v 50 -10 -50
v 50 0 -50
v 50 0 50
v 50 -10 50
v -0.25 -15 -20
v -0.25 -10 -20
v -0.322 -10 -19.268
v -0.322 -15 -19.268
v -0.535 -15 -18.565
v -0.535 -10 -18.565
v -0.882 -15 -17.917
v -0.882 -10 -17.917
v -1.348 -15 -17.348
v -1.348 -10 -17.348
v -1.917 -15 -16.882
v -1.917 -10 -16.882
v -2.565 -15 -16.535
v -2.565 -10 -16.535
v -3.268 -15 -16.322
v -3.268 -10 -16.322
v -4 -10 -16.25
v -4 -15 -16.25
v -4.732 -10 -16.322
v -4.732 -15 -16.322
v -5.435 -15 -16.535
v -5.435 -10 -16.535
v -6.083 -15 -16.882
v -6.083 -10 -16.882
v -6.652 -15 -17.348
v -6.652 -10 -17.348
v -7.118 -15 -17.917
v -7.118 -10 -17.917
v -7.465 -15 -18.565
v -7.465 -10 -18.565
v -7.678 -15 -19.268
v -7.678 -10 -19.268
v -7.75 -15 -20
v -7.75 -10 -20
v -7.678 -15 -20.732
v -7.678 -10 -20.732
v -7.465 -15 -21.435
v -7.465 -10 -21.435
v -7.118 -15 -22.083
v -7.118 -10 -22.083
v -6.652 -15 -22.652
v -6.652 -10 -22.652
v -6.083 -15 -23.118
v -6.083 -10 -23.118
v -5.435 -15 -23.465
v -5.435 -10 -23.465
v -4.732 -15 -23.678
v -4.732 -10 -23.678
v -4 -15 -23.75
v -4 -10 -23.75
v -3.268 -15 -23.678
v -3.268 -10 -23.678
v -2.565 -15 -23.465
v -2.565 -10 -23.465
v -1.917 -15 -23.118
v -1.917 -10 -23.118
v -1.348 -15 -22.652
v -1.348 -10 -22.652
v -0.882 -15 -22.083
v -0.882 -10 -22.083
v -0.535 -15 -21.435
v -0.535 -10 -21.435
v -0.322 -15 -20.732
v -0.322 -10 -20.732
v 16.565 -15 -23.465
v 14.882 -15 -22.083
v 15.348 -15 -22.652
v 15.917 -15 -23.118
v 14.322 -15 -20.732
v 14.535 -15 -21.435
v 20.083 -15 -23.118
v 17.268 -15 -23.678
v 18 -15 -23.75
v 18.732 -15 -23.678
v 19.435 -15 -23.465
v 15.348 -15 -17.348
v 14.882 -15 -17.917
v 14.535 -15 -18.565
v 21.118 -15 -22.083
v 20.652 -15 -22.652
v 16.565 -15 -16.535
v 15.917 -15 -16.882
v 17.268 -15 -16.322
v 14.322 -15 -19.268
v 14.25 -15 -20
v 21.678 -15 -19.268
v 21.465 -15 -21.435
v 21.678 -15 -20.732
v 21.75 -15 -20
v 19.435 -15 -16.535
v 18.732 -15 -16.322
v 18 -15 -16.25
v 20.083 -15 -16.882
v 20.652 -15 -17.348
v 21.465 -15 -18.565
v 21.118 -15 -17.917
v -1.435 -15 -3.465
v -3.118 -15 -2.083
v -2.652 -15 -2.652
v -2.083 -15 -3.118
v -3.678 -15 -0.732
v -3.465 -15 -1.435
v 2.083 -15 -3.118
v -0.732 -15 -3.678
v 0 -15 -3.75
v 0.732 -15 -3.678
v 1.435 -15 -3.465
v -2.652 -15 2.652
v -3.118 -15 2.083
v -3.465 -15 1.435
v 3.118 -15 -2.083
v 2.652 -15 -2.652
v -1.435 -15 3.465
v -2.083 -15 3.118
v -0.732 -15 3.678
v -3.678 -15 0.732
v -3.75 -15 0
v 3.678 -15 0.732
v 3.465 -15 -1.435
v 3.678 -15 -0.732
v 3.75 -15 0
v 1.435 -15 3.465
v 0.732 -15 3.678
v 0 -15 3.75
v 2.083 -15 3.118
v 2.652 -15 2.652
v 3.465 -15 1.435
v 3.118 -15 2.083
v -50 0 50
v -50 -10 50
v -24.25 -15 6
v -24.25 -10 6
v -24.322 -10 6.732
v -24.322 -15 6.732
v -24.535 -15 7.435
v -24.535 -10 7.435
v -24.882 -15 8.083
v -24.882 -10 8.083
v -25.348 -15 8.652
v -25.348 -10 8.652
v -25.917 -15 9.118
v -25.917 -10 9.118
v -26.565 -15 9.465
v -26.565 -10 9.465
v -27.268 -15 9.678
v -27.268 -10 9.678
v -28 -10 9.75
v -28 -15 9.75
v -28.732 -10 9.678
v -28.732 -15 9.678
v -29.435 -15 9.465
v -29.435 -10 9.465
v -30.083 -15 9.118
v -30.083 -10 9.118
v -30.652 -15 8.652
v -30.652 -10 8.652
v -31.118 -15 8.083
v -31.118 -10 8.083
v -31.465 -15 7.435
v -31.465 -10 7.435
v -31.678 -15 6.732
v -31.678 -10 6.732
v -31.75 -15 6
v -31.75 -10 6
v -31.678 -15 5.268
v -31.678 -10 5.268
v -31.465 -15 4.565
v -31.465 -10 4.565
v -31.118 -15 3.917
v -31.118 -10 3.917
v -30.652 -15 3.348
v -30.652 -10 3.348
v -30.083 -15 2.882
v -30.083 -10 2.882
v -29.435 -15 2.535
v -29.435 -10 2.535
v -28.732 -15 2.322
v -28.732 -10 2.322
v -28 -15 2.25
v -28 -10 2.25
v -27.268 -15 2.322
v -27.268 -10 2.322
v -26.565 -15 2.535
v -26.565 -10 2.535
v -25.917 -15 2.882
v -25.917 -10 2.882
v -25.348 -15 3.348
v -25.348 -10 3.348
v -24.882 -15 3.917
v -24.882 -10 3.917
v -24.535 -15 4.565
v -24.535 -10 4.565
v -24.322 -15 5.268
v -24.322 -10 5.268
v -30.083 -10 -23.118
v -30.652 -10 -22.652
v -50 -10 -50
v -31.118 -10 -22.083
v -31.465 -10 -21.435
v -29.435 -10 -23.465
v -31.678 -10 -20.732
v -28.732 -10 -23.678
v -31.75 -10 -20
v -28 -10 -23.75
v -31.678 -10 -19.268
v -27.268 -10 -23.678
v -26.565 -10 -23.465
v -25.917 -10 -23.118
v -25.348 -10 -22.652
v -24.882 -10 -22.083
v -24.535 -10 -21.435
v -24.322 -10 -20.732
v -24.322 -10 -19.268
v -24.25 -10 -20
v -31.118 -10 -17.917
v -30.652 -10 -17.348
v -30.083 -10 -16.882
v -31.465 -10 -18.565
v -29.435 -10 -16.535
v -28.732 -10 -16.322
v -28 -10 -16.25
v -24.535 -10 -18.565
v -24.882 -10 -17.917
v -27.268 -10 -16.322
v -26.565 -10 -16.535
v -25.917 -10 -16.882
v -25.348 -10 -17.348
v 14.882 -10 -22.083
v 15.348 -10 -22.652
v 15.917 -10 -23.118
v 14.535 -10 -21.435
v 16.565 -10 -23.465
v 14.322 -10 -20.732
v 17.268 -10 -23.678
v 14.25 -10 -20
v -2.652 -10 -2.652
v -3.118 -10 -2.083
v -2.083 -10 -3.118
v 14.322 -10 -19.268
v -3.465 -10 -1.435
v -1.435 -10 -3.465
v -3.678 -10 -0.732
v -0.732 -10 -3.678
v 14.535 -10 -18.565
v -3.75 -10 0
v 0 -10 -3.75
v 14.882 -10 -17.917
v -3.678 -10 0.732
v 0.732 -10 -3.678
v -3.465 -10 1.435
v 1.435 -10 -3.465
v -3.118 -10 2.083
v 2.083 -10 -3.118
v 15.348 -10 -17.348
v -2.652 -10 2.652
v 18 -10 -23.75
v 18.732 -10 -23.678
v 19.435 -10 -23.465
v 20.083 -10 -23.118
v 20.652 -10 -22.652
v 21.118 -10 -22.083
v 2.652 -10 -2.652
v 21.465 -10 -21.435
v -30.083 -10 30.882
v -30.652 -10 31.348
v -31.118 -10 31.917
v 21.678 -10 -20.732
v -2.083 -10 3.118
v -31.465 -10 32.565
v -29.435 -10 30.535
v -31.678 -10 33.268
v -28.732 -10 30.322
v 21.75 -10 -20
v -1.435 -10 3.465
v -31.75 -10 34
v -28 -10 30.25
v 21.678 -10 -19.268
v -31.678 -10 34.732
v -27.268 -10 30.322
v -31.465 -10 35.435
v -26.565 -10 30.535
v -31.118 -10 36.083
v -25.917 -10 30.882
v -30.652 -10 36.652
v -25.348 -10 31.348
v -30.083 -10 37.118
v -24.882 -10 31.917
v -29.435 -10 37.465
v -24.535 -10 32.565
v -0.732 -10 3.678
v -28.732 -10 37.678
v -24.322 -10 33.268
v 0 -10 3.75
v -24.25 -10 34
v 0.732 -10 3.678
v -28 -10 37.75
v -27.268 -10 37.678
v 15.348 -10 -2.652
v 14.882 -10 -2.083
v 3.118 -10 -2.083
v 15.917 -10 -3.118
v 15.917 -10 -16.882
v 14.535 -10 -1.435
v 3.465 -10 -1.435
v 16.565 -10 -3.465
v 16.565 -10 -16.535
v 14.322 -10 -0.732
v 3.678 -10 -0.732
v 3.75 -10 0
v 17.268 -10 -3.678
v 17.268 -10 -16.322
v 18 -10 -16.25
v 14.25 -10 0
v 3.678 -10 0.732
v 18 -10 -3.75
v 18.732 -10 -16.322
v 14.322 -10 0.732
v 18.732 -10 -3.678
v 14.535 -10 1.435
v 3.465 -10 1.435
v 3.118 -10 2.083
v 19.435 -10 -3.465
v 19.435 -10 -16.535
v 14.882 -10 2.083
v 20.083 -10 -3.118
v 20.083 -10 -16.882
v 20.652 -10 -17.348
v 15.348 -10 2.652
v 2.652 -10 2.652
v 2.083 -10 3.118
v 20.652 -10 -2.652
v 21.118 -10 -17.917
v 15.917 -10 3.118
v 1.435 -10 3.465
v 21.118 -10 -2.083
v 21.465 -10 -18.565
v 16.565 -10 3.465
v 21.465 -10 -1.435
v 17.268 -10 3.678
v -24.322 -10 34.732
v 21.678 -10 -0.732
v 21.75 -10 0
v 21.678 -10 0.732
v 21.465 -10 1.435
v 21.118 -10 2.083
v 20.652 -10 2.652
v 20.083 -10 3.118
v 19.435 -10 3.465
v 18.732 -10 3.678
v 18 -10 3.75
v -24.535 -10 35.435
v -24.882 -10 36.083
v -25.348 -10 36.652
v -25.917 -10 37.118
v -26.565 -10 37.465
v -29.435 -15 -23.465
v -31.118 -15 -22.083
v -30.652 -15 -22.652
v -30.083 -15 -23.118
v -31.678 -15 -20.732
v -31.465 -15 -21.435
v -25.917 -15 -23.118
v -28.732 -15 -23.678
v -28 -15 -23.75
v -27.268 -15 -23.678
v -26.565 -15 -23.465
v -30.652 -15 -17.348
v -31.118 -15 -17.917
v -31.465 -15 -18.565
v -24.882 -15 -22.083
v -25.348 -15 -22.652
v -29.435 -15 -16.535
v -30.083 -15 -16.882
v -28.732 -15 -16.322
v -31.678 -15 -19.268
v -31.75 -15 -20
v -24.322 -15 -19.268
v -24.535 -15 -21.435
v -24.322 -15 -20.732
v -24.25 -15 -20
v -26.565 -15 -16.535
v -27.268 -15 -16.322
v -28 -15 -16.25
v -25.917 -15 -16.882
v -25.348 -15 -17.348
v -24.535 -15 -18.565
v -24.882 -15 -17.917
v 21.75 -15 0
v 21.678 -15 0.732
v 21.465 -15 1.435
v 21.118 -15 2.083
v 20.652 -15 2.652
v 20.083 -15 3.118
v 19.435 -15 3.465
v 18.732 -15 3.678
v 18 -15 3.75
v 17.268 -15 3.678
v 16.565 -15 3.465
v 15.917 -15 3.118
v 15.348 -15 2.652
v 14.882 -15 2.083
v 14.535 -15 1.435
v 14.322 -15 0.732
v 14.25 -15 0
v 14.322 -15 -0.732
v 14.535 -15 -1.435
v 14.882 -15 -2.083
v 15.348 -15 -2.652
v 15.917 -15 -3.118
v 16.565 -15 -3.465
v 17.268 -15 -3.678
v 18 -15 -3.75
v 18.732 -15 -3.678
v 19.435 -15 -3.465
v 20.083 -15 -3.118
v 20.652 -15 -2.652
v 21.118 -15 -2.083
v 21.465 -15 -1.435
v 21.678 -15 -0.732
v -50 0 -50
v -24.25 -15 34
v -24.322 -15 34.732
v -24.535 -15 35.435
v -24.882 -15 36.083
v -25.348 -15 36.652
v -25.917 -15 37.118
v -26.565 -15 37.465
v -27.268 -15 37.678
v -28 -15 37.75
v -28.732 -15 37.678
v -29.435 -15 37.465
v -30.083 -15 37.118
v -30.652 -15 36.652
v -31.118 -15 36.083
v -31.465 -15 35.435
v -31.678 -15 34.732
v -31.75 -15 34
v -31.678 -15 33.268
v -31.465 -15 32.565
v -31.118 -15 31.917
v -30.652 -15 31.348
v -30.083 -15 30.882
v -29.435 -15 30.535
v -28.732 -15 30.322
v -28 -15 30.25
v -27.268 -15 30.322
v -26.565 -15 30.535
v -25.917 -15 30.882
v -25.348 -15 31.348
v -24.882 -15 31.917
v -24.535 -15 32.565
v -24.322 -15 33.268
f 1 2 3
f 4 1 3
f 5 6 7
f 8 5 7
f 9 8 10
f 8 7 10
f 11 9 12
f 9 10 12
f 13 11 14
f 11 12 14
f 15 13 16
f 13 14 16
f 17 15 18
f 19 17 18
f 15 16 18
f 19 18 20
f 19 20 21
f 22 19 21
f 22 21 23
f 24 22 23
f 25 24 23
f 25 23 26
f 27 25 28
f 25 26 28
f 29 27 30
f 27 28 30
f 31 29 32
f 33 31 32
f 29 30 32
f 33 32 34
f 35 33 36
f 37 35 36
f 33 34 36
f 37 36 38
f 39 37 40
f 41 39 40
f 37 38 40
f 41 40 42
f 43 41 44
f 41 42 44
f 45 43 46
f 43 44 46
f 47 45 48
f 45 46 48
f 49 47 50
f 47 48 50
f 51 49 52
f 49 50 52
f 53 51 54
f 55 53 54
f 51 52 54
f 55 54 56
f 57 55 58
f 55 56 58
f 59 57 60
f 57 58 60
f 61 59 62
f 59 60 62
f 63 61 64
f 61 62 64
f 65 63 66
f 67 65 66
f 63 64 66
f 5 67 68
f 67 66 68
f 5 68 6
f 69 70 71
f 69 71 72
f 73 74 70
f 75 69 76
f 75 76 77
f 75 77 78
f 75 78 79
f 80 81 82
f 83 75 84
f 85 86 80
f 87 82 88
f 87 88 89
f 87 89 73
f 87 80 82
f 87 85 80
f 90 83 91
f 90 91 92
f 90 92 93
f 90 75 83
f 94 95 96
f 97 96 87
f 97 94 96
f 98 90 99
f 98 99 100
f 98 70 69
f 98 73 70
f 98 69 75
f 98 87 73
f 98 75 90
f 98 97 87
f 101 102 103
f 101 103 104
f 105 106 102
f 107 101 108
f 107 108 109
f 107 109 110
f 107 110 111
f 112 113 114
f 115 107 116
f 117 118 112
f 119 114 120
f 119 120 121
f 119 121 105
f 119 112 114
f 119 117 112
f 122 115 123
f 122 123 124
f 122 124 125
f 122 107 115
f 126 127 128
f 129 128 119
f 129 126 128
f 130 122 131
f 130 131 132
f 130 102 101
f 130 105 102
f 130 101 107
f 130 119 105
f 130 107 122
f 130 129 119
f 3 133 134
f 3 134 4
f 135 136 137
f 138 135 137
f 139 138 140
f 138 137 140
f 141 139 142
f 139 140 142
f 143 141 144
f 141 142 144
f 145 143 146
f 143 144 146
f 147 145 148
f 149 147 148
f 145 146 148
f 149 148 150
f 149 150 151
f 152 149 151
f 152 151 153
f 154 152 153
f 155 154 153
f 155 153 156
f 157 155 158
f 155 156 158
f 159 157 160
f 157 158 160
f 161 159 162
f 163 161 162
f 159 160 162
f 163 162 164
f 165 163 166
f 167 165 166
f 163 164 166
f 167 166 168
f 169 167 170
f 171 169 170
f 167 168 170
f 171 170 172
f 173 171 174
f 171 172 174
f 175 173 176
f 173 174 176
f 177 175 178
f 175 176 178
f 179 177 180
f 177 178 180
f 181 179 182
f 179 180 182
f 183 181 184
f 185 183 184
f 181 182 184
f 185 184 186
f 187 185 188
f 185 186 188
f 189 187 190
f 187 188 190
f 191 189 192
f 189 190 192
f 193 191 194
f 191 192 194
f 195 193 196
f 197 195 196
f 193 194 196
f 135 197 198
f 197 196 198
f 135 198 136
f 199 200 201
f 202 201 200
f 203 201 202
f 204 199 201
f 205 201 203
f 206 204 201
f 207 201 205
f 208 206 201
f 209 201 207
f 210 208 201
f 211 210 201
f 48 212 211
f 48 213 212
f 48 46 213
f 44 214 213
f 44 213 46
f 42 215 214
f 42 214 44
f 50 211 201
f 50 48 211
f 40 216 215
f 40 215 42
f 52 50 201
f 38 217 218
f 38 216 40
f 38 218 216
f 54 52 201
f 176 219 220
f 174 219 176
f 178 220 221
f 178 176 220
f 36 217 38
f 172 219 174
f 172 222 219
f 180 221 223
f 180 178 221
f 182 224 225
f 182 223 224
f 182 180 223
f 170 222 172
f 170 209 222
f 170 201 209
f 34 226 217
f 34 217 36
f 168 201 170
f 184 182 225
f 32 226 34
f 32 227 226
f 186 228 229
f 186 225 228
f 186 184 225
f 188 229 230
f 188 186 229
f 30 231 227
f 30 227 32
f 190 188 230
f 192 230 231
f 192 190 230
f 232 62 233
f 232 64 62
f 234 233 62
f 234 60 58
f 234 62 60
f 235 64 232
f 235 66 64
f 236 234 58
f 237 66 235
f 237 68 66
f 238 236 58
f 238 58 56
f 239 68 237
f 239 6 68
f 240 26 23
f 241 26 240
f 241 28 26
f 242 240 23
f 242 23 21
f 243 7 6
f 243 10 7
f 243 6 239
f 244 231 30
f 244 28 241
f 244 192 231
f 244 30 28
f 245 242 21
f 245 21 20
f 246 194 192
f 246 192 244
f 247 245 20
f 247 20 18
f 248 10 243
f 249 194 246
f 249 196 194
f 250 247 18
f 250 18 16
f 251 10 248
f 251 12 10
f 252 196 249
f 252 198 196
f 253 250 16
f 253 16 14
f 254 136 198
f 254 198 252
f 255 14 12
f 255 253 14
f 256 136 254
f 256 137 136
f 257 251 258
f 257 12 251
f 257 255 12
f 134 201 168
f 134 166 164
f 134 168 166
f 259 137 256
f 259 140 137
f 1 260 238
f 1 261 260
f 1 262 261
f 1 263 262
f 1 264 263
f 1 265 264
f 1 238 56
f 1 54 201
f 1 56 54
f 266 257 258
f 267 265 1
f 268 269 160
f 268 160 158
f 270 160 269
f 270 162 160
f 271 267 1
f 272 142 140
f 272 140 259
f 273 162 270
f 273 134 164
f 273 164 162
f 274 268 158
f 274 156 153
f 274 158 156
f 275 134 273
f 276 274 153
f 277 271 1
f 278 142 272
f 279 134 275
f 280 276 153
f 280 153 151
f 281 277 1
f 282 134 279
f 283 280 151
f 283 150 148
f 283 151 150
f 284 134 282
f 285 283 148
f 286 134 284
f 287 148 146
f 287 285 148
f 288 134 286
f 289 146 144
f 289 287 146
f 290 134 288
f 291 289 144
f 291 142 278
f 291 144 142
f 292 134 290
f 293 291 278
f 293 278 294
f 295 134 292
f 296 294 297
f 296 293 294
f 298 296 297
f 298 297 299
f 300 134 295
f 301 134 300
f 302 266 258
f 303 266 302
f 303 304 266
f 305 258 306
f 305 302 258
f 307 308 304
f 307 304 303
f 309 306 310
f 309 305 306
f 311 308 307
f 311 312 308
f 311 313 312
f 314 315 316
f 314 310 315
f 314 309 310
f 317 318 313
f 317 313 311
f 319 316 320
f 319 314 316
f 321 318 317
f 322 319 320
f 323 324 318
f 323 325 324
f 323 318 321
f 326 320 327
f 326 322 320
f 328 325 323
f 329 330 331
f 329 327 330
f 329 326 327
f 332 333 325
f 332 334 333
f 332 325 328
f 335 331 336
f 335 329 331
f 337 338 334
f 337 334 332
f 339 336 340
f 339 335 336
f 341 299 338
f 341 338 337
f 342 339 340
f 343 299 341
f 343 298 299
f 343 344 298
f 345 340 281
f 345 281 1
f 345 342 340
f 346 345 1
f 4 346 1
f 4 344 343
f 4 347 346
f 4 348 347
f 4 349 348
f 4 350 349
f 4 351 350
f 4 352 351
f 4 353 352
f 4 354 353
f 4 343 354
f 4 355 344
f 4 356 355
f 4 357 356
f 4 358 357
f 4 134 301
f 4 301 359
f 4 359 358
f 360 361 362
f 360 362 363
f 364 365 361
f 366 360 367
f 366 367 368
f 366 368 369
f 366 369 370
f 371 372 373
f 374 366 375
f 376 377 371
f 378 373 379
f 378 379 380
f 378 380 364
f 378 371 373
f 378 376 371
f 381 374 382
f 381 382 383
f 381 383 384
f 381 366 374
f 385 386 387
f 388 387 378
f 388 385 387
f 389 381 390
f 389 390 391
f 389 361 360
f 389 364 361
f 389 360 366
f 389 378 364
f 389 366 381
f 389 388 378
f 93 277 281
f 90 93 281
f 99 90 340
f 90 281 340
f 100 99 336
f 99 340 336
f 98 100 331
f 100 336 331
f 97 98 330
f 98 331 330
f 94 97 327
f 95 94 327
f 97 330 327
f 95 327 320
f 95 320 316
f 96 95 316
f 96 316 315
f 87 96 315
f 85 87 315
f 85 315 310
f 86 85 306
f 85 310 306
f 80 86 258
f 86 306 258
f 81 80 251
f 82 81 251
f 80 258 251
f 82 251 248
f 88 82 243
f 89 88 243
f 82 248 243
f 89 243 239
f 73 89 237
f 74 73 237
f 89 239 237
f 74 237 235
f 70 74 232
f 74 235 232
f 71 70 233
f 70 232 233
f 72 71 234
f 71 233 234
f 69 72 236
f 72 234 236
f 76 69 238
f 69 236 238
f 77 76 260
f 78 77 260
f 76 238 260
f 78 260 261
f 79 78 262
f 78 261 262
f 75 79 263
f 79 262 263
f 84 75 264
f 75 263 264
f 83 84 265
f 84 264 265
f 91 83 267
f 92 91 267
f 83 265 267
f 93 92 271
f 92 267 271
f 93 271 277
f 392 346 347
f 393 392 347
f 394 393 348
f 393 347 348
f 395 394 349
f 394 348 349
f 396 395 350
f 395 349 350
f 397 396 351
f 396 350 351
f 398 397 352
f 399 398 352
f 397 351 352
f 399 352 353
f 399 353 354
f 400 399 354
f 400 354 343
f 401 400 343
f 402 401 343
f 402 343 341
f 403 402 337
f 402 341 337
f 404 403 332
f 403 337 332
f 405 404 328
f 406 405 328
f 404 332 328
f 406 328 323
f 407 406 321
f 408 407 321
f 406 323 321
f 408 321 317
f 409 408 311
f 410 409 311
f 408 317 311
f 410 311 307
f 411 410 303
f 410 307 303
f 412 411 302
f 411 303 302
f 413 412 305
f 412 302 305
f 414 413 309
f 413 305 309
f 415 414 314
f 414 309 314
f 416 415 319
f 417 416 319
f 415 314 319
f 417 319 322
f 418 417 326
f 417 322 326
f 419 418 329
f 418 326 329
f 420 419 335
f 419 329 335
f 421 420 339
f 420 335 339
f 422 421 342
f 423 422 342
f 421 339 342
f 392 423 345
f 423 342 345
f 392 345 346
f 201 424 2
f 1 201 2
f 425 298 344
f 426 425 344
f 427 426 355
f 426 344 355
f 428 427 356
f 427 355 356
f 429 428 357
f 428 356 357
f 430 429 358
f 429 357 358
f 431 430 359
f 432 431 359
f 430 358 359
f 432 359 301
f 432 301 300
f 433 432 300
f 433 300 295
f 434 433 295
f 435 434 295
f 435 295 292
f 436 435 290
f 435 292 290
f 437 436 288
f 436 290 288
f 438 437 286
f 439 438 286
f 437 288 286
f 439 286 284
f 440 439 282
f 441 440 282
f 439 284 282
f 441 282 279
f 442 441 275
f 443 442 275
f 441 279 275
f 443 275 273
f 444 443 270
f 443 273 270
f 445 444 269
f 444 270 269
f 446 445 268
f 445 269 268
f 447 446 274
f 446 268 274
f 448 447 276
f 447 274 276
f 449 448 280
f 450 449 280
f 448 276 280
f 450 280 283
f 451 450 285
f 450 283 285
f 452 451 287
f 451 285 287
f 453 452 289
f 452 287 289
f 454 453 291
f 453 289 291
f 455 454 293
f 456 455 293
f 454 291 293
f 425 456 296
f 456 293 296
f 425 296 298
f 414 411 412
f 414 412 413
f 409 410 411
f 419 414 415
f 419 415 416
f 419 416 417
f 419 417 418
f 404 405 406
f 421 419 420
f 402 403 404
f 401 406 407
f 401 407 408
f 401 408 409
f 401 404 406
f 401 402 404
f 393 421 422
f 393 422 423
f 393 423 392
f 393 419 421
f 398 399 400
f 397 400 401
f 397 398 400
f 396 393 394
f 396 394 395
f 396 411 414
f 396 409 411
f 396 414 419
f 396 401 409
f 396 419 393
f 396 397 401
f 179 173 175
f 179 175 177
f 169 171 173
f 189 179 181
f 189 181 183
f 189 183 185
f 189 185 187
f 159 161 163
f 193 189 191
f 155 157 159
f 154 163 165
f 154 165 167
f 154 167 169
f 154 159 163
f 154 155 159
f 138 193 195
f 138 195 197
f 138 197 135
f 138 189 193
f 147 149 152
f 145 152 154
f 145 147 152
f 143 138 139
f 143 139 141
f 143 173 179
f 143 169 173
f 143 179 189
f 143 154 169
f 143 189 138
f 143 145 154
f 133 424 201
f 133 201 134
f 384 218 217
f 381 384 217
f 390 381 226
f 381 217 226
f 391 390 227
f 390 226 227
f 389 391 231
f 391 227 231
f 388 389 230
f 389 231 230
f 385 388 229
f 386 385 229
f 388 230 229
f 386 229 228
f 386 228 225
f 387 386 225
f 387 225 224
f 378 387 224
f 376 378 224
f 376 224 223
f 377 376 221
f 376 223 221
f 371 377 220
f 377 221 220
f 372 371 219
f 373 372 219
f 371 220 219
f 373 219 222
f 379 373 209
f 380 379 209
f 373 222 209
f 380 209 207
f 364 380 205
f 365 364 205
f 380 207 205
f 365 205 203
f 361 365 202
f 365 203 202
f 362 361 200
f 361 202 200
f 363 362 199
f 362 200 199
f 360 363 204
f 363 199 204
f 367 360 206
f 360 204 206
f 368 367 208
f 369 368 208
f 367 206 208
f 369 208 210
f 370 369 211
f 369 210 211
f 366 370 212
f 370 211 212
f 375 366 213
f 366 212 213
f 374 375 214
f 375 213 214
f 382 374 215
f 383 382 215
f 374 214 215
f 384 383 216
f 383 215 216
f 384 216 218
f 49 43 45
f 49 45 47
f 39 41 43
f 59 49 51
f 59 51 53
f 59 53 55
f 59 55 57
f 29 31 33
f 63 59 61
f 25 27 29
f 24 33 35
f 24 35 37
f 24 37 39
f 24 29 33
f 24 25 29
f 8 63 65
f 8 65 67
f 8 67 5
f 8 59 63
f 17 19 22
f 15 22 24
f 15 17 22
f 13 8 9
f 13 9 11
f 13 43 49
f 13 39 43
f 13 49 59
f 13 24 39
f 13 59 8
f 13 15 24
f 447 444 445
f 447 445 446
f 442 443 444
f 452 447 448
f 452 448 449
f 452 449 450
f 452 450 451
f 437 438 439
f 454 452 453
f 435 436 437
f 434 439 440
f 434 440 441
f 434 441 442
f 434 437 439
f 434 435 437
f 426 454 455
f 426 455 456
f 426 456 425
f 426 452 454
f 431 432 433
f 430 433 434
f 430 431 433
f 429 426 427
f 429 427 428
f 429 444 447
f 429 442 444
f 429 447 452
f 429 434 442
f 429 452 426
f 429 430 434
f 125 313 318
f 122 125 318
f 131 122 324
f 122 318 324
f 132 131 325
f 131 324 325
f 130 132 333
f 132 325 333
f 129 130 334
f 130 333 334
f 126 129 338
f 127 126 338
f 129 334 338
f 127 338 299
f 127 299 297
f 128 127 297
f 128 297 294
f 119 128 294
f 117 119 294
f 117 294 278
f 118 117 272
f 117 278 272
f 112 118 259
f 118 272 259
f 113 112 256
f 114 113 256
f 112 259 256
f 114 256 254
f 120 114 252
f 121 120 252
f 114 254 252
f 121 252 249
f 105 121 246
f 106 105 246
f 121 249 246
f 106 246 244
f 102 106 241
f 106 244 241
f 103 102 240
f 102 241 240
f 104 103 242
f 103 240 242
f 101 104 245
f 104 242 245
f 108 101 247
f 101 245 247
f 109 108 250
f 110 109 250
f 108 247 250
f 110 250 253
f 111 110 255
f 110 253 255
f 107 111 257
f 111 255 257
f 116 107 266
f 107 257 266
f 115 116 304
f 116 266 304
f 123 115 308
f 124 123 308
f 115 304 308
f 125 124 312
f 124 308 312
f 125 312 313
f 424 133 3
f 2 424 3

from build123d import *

# Parameters (mm, degrees)
F0_W      = 100
F0_H      = 100
F1_DEPTH  = 10
F2_R      = 3.75
F3_DEPTH  = 5
F4_R      = 3.75
F5_DEPTH  = 5
F7_R      = 3.75
F8_DEPTH  = 5
F9_R      = 3.75
F10_DEPTH = 5
F11_R     = 3.75
F12_DEPTH = 5
F13_R     = 3.75
F14_DEPTH = 5
F6_R      = 3.75
F15_DEPTH = 5


with BuildPart() as f1:
    # F0 (on Front) → F1 (new body)
    with BuildSketch(Plane.XZ):
        Rectangle(F0_W, F0_H)
    extrude(amount=F1_DEPTH)

    # F2 (on face) → F3 (join)
    with BuildSketch(Plane.XZ.offset(10)):
        Circle(F2_R)
    extrude(amount=F3_DEPTH)

    # F4 (on face) → F5 (join)
    with BuildSketch(Plane.XZ.offset(10)):
        with Locations((18, 0)):
            Circle(F4_R)
    extrude(amount=F5_DEPTH)

    # F7 (on face) → F8 (join)
    with BuildSketch(Plane.XZ.offset(10)):
        with Locations((-4, -20)):
            Circle(F7_R)
    extrude(amount=F8_DEPTH)

    # F9 (on face) → F10 (join)
    with BuildSketch(Plane.XZ.offset(10)):
        with Locations((-28, -20)):
            Circle(F9_R)
    extrude(amount=F10_DEPTH)

    # F11 (on face) → F12 (join)
    with BuildSketch(Plane.XZ.offset(10)):
        with Locations((-28, 6)):
            Circle(F11_R)
    extrude(amount=F12_DEPTH)

    # F13 (on face) → F14 (join)
    with BuildSketch(Plane.XZ.offset(10)):
        with Locations((-28, 34)):
            Circle(F13_R)
    extrude(amount=F14_DEPTH)

    # F6 (on face) → F15 (join)
    with BuildSketch(Plane.XZ.offset(10)):
        with Locations((18, -20)):
            Circle(F6_R)
    extrude(amount=F15_DEPTH)


solid = f1.part
